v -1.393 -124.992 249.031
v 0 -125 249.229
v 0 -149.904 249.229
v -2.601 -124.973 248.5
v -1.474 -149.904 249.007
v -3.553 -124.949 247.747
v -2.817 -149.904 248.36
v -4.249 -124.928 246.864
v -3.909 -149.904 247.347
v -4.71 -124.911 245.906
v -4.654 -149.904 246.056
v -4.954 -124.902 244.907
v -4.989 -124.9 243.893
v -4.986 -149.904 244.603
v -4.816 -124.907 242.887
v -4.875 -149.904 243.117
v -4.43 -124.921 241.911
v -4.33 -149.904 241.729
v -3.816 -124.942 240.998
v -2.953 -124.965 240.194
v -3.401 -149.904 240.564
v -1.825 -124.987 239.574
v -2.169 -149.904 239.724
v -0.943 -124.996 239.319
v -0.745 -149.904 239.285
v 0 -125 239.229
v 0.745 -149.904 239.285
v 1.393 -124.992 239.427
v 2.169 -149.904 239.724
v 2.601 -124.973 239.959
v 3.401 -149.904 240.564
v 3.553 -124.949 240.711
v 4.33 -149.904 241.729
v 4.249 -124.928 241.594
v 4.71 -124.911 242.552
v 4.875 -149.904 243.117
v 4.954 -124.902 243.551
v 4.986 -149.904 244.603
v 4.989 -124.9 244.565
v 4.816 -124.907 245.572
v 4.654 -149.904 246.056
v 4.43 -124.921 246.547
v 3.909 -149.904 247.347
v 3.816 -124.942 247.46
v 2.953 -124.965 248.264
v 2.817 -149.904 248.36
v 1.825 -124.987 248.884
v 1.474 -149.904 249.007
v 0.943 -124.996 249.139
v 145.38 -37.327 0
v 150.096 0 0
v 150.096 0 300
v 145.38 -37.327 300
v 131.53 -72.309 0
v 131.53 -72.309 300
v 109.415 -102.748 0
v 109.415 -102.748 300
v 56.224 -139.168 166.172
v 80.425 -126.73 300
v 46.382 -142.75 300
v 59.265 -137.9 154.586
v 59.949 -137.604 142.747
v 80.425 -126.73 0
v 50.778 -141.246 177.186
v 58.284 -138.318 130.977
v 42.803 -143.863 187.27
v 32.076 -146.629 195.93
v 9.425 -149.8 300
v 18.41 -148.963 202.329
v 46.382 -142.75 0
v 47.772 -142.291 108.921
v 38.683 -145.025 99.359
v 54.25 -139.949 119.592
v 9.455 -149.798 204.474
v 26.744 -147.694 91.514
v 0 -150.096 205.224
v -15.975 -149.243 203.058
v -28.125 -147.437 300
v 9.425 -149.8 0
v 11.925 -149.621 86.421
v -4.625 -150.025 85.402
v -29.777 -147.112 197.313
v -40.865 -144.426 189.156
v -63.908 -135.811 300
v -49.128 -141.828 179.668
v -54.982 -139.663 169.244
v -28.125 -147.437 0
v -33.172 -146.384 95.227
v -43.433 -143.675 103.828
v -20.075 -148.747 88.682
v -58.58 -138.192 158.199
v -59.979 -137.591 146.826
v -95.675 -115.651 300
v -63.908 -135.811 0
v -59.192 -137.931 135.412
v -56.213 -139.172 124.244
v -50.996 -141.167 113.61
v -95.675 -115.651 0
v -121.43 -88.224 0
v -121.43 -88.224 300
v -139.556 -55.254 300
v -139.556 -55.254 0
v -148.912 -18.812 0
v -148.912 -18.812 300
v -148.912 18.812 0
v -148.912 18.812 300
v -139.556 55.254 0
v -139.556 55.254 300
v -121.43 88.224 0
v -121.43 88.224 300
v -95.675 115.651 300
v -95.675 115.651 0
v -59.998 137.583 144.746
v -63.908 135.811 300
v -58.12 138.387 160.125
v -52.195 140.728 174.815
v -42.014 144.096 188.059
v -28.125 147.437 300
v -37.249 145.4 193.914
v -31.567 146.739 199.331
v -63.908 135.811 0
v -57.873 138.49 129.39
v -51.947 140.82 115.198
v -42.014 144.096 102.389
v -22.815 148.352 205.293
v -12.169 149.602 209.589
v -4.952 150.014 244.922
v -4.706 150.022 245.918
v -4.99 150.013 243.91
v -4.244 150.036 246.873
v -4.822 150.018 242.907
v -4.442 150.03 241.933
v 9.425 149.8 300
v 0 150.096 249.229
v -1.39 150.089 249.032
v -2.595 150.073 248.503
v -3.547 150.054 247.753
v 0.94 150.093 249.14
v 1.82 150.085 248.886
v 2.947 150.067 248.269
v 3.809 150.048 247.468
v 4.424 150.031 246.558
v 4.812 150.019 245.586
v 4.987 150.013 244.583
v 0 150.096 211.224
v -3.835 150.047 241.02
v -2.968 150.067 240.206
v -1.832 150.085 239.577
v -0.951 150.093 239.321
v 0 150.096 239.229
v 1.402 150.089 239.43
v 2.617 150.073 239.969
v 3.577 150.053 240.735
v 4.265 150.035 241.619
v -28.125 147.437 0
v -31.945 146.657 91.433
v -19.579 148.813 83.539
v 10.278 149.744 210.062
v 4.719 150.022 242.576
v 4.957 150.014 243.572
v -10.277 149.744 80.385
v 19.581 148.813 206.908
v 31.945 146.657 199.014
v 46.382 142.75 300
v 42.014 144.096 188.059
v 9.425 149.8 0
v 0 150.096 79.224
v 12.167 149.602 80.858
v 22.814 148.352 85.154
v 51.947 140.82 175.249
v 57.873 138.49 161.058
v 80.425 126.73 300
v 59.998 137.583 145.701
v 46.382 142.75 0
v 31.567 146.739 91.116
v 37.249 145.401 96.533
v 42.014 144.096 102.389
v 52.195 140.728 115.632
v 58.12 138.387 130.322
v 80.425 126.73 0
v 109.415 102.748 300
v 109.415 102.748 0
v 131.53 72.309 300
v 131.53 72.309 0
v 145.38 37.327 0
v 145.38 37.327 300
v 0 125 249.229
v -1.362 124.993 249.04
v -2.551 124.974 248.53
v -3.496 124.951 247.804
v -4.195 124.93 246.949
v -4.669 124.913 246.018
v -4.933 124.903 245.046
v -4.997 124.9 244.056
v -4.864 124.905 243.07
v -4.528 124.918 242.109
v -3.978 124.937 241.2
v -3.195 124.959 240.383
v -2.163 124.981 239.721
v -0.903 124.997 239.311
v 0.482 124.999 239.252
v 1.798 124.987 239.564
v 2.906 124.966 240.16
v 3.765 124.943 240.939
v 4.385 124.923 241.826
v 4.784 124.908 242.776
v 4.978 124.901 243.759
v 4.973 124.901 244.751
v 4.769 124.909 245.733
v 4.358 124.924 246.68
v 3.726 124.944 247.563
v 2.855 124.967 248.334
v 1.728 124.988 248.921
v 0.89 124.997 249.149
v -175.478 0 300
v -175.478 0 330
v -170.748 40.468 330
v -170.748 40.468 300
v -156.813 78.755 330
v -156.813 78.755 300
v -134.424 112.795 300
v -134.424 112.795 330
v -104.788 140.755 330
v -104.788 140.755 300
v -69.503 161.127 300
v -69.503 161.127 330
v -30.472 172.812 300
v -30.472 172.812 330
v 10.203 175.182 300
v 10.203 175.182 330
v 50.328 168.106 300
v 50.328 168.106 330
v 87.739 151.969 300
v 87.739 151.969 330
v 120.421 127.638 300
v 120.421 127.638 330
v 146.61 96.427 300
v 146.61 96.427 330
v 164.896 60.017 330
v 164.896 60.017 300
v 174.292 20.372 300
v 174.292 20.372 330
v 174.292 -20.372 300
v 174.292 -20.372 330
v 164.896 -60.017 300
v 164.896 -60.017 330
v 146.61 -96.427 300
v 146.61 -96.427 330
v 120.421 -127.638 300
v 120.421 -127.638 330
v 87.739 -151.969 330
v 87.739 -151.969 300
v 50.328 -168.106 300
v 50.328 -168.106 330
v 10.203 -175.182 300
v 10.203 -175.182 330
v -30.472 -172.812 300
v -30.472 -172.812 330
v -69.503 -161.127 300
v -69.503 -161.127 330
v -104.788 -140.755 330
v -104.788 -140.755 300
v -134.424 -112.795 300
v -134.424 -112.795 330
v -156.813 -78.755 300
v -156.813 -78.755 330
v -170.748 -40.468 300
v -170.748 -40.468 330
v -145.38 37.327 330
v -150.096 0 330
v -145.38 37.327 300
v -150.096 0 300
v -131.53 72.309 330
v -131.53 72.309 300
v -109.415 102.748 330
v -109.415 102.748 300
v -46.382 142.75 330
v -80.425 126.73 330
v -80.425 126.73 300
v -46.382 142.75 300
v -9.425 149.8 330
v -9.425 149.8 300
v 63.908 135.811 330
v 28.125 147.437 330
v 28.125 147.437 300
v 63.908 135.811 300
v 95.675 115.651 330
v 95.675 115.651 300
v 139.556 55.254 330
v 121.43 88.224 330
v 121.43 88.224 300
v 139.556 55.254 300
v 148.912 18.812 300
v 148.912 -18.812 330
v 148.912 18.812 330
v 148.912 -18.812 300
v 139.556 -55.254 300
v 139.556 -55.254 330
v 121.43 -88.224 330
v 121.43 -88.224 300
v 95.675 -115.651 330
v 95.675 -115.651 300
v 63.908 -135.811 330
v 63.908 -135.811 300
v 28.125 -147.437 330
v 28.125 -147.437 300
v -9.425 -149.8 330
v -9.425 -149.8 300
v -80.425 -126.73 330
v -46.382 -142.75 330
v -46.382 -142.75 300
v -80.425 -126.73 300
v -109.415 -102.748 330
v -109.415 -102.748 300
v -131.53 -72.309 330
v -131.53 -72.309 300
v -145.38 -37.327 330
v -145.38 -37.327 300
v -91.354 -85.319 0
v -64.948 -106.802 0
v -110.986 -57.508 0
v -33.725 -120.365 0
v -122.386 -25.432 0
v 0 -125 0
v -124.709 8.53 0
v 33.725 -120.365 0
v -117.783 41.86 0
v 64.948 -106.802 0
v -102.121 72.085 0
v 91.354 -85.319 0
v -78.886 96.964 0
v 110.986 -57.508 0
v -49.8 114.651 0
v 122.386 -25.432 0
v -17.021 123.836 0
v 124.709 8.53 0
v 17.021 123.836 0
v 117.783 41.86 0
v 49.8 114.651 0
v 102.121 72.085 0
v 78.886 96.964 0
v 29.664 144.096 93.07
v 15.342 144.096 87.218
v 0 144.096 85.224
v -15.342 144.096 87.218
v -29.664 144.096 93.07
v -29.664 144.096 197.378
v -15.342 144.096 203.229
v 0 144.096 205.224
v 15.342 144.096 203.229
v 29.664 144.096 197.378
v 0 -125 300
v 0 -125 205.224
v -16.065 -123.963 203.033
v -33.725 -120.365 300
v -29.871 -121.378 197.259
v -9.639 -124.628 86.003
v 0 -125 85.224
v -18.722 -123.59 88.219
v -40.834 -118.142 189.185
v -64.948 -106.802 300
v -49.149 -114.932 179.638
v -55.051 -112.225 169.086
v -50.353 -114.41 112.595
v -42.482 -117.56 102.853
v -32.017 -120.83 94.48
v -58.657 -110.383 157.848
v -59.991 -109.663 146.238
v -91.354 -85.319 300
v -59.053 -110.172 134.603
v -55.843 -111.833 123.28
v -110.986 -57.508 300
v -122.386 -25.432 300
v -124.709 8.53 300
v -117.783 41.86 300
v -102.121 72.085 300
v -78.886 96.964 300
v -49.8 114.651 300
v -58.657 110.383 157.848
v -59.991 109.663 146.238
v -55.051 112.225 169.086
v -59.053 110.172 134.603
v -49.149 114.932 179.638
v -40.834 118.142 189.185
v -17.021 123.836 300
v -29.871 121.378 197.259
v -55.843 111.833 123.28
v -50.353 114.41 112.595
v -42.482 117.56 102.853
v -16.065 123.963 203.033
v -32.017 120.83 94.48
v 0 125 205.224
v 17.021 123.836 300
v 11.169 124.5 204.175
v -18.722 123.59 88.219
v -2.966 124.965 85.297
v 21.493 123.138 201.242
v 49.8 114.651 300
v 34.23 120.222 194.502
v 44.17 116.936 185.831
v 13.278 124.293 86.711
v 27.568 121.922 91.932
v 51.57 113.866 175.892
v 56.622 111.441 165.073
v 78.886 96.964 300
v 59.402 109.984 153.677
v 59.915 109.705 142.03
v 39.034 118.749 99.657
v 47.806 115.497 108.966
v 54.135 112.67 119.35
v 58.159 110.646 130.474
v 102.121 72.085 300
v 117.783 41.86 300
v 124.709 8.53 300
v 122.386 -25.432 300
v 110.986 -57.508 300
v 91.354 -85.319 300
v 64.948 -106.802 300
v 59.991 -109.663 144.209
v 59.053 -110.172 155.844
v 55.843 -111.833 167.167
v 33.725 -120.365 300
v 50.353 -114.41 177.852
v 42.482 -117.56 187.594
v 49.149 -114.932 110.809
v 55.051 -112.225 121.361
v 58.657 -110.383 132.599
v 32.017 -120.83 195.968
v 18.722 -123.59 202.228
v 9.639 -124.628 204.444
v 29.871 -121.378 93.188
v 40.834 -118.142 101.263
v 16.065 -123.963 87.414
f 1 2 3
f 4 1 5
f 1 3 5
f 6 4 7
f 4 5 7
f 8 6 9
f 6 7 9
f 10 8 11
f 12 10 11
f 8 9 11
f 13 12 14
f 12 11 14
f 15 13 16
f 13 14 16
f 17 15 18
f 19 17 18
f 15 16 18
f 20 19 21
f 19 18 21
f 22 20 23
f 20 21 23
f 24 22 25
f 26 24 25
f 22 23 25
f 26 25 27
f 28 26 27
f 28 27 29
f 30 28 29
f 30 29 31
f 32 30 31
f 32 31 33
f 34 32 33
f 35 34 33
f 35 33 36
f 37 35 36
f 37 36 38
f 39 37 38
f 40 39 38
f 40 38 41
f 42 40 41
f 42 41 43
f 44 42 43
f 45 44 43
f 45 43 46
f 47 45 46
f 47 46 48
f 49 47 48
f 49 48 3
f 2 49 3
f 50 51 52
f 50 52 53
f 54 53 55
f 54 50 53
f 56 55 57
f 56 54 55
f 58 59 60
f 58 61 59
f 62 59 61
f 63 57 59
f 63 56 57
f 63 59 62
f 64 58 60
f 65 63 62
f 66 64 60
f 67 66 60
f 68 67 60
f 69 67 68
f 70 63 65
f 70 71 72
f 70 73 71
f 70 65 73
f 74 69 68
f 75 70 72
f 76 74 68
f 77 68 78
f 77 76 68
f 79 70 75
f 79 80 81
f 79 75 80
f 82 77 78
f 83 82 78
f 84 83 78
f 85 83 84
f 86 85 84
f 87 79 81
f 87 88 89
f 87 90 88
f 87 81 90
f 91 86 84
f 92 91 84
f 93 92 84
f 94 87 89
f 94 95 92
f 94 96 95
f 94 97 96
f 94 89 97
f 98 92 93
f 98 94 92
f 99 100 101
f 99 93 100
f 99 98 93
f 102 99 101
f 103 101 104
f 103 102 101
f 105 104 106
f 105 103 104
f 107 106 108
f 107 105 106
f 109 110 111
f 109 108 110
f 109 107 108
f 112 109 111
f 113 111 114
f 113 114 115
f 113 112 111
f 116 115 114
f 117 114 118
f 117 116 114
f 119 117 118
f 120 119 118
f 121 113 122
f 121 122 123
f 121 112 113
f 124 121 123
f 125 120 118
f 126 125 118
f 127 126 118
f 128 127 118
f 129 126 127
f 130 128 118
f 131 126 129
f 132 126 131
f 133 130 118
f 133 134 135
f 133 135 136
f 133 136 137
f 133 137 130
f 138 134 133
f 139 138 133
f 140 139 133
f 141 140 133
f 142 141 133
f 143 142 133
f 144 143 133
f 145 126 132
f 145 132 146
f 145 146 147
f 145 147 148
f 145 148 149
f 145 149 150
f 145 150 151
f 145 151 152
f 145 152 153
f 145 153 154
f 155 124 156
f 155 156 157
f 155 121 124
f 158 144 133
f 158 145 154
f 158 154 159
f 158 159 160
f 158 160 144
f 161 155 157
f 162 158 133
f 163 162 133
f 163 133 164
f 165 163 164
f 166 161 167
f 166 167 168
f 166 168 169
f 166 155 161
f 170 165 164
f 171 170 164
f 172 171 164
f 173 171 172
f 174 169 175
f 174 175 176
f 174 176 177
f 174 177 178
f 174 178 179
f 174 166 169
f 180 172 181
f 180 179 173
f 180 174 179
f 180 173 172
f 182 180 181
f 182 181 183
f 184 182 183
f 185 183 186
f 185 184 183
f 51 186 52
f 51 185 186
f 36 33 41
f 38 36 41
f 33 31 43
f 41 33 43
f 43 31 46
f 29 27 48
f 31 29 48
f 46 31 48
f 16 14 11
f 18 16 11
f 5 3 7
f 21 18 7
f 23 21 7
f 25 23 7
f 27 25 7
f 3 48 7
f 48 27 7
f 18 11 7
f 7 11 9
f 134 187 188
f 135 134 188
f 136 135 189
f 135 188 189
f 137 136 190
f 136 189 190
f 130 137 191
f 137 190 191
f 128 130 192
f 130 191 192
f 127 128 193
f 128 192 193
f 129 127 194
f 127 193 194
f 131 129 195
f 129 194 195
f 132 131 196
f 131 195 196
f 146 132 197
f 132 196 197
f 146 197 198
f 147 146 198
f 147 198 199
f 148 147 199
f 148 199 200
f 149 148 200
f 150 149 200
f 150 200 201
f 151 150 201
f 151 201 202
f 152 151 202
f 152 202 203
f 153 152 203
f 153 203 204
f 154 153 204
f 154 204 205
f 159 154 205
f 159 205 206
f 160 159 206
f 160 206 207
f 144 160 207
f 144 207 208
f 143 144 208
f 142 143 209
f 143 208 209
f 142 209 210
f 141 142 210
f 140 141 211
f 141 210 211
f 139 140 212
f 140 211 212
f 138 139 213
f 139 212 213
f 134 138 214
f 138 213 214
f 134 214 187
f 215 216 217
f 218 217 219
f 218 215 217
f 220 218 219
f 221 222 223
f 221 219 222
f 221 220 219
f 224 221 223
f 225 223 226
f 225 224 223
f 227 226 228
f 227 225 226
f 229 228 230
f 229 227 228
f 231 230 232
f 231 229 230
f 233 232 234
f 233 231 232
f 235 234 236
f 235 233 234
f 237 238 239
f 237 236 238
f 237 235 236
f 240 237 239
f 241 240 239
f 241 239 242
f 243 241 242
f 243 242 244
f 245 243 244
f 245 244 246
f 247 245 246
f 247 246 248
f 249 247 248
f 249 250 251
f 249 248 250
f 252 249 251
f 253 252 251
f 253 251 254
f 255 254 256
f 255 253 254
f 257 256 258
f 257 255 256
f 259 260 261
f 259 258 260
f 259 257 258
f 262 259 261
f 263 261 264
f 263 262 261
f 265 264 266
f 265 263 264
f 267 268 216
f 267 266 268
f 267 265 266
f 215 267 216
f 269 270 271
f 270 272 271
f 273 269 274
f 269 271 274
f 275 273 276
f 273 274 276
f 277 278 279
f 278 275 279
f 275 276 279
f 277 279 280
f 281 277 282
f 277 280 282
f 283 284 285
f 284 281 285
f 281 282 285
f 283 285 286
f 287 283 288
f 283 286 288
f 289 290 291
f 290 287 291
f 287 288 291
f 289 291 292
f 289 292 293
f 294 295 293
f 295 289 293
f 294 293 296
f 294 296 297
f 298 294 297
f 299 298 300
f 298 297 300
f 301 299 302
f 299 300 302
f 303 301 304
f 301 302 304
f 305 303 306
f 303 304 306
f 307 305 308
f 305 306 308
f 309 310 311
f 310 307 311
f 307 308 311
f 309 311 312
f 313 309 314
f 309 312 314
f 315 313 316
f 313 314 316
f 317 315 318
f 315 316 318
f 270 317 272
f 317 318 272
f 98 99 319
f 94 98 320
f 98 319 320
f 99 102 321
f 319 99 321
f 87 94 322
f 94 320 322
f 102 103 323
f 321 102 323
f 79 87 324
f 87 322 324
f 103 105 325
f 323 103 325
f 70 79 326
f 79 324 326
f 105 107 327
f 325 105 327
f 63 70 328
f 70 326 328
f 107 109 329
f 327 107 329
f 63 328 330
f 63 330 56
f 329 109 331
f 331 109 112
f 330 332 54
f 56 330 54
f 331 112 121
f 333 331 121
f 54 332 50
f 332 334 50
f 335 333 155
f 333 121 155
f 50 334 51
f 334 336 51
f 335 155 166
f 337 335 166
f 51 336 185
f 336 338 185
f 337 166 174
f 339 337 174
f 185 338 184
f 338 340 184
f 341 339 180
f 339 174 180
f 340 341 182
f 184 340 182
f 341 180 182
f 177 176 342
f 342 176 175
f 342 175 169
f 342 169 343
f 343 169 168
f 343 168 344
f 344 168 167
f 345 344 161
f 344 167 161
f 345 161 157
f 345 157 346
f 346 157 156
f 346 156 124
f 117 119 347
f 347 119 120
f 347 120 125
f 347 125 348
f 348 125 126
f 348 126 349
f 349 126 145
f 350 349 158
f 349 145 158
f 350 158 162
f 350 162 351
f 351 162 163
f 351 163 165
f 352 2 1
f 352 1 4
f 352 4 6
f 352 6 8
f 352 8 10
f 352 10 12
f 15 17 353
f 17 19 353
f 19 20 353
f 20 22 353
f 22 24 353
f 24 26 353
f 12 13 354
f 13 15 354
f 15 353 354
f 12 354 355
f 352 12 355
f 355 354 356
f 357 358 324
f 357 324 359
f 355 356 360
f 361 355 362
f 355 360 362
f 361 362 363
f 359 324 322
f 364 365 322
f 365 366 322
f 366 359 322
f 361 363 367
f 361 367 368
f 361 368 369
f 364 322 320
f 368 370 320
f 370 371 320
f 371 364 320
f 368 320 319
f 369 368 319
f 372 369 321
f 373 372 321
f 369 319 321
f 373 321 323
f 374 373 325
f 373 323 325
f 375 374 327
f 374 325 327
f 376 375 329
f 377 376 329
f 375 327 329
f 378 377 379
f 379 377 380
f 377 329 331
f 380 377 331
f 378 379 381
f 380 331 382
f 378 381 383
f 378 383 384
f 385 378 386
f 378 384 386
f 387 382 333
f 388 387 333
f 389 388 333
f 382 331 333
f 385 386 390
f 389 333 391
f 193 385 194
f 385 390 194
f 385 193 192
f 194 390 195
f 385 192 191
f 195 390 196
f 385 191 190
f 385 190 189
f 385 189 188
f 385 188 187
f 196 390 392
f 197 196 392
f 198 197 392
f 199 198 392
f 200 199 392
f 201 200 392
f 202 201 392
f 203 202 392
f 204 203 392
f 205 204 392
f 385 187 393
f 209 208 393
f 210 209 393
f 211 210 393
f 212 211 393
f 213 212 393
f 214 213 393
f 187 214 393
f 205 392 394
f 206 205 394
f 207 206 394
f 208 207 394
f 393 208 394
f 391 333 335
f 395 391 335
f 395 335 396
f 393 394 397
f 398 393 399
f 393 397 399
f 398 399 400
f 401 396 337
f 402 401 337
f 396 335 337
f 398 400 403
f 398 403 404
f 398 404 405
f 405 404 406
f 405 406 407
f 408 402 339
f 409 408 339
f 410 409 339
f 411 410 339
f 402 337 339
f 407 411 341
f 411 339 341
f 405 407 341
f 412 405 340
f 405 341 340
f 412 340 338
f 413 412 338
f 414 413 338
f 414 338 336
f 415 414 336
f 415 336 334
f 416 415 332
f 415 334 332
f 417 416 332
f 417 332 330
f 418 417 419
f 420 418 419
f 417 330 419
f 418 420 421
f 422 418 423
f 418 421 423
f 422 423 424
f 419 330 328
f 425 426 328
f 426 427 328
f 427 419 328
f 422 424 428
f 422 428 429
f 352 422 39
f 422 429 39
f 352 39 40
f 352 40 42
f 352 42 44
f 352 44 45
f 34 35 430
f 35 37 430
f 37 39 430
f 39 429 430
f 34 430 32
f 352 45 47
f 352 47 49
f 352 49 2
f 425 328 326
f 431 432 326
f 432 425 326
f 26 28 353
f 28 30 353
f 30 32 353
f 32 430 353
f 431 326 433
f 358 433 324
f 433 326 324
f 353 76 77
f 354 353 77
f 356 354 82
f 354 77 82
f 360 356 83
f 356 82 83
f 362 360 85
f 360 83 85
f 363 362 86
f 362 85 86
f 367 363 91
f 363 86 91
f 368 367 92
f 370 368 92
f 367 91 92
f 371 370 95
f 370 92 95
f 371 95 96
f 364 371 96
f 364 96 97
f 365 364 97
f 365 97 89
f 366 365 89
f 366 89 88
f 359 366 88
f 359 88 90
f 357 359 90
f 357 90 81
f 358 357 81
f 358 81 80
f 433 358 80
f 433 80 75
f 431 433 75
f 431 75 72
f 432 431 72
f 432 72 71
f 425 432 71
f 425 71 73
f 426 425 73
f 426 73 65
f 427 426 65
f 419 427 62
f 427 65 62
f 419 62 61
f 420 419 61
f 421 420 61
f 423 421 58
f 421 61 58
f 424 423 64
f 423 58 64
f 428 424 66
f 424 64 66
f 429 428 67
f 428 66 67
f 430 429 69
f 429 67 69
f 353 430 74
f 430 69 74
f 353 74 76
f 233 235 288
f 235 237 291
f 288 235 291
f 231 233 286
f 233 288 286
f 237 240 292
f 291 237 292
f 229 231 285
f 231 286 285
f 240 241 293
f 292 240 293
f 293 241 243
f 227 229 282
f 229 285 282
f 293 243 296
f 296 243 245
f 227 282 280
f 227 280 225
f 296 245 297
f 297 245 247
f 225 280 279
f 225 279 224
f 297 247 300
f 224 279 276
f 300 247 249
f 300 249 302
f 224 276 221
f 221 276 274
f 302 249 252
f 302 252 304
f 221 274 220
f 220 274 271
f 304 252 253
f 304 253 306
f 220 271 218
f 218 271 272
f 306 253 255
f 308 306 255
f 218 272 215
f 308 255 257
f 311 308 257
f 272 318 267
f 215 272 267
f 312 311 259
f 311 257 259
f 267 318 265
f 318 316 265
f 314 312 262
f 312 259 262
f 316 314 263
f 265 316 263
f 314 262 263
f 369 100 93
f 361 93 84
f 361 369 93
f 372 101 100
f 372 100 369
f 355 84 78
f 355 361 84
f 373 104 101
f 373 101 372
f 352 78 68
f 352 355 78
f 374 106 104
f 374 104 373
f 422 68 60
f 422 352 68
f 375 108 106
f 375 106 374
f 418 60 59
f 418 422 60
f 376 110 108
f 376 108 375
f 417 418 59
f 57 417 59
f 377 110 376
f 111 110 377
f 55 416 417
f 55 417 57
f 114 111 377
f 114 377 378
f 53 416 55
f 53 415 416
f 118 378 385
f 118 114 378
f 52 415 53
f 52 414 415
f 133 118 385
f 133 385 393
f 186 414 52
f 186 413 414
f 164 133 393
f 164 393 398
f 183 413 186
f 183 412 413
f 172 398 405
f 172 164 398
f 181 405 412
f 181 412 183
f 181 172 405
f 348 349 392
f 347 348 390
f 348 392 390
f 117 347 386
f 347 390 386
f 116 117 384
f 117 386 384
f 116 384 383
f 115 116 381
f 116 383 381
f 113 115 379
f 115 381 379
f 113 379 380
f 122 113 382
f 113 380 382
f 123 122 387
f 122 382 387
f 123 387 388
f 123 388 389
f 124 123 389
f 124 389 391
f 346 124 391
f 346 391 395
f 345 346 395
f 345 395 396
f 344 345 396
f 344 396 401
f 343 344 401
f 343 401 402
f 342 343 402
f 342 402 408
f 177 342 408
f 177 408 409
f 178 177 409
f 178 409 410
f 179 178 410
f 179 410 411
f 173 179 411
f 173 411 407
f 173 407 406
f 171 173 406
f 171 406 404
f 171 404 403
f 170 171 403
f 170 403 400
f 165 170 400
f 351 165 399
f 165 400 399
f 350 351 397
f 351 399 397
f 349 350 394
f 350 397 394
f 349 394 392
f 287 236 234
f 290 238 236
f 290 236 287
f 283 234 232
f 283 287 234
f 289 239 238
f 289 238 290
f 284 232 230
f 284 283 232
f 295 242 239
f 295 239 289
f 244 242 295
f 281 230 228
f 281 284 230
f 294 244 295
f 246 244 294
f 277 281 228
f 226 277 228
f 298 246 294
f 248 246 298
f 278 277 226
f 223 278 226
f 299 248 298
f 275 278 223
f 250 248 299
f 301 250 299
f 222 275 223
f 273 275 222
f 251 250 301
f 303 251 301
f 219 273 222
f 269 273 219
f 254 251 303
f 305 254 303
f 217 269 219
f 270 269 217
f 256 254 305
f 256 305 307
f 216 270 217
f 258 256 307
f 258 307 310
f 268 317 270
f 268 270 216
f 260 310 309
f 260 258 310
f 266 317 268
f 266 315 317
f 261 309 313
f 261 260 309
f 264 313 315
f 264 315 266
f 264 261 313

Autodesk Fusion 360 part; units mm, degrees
sketch "Sketch1" plane through (0, 0, 0) normal (0, 0, 1) x (1, 0, 0)
  circle A0 centre (0, 0) radius 150.0959
extrude "Extrude1" add sketch "Sketch1" along normal blind 300 makes body 1
hole "Hole1" at (0, 150.0959, 145.2237) direction (0, -1, 0) diameter 120 depth 340 tip angle 180 countersink diameter 132 countersink angle 90 bodies 1
hole "Hole2" at (0, 0, 300) direction (0, 0, -1) diameter 250 depth 300 tip angle 180 bodies 1
hole "Hole3" at (0, 150.0959, 244.2292) direction (0, -1, 0) diameter 10 depth 300 tip angle 180 bodies 1
sketch "Sketch2" plane through (0, 0, 300) normal (0, 0, 1) x (-1, 0, 0)
  circle A0 centre (0, 0) radius 125
  circle A1 centre (0, 0) radius 150.0959
  circle A2 centre (0, 0) radius 175.4784
extrude "Extrude2" add sketch "Sketch2" along normal blind 30 separate body contours A2 makes body 2
